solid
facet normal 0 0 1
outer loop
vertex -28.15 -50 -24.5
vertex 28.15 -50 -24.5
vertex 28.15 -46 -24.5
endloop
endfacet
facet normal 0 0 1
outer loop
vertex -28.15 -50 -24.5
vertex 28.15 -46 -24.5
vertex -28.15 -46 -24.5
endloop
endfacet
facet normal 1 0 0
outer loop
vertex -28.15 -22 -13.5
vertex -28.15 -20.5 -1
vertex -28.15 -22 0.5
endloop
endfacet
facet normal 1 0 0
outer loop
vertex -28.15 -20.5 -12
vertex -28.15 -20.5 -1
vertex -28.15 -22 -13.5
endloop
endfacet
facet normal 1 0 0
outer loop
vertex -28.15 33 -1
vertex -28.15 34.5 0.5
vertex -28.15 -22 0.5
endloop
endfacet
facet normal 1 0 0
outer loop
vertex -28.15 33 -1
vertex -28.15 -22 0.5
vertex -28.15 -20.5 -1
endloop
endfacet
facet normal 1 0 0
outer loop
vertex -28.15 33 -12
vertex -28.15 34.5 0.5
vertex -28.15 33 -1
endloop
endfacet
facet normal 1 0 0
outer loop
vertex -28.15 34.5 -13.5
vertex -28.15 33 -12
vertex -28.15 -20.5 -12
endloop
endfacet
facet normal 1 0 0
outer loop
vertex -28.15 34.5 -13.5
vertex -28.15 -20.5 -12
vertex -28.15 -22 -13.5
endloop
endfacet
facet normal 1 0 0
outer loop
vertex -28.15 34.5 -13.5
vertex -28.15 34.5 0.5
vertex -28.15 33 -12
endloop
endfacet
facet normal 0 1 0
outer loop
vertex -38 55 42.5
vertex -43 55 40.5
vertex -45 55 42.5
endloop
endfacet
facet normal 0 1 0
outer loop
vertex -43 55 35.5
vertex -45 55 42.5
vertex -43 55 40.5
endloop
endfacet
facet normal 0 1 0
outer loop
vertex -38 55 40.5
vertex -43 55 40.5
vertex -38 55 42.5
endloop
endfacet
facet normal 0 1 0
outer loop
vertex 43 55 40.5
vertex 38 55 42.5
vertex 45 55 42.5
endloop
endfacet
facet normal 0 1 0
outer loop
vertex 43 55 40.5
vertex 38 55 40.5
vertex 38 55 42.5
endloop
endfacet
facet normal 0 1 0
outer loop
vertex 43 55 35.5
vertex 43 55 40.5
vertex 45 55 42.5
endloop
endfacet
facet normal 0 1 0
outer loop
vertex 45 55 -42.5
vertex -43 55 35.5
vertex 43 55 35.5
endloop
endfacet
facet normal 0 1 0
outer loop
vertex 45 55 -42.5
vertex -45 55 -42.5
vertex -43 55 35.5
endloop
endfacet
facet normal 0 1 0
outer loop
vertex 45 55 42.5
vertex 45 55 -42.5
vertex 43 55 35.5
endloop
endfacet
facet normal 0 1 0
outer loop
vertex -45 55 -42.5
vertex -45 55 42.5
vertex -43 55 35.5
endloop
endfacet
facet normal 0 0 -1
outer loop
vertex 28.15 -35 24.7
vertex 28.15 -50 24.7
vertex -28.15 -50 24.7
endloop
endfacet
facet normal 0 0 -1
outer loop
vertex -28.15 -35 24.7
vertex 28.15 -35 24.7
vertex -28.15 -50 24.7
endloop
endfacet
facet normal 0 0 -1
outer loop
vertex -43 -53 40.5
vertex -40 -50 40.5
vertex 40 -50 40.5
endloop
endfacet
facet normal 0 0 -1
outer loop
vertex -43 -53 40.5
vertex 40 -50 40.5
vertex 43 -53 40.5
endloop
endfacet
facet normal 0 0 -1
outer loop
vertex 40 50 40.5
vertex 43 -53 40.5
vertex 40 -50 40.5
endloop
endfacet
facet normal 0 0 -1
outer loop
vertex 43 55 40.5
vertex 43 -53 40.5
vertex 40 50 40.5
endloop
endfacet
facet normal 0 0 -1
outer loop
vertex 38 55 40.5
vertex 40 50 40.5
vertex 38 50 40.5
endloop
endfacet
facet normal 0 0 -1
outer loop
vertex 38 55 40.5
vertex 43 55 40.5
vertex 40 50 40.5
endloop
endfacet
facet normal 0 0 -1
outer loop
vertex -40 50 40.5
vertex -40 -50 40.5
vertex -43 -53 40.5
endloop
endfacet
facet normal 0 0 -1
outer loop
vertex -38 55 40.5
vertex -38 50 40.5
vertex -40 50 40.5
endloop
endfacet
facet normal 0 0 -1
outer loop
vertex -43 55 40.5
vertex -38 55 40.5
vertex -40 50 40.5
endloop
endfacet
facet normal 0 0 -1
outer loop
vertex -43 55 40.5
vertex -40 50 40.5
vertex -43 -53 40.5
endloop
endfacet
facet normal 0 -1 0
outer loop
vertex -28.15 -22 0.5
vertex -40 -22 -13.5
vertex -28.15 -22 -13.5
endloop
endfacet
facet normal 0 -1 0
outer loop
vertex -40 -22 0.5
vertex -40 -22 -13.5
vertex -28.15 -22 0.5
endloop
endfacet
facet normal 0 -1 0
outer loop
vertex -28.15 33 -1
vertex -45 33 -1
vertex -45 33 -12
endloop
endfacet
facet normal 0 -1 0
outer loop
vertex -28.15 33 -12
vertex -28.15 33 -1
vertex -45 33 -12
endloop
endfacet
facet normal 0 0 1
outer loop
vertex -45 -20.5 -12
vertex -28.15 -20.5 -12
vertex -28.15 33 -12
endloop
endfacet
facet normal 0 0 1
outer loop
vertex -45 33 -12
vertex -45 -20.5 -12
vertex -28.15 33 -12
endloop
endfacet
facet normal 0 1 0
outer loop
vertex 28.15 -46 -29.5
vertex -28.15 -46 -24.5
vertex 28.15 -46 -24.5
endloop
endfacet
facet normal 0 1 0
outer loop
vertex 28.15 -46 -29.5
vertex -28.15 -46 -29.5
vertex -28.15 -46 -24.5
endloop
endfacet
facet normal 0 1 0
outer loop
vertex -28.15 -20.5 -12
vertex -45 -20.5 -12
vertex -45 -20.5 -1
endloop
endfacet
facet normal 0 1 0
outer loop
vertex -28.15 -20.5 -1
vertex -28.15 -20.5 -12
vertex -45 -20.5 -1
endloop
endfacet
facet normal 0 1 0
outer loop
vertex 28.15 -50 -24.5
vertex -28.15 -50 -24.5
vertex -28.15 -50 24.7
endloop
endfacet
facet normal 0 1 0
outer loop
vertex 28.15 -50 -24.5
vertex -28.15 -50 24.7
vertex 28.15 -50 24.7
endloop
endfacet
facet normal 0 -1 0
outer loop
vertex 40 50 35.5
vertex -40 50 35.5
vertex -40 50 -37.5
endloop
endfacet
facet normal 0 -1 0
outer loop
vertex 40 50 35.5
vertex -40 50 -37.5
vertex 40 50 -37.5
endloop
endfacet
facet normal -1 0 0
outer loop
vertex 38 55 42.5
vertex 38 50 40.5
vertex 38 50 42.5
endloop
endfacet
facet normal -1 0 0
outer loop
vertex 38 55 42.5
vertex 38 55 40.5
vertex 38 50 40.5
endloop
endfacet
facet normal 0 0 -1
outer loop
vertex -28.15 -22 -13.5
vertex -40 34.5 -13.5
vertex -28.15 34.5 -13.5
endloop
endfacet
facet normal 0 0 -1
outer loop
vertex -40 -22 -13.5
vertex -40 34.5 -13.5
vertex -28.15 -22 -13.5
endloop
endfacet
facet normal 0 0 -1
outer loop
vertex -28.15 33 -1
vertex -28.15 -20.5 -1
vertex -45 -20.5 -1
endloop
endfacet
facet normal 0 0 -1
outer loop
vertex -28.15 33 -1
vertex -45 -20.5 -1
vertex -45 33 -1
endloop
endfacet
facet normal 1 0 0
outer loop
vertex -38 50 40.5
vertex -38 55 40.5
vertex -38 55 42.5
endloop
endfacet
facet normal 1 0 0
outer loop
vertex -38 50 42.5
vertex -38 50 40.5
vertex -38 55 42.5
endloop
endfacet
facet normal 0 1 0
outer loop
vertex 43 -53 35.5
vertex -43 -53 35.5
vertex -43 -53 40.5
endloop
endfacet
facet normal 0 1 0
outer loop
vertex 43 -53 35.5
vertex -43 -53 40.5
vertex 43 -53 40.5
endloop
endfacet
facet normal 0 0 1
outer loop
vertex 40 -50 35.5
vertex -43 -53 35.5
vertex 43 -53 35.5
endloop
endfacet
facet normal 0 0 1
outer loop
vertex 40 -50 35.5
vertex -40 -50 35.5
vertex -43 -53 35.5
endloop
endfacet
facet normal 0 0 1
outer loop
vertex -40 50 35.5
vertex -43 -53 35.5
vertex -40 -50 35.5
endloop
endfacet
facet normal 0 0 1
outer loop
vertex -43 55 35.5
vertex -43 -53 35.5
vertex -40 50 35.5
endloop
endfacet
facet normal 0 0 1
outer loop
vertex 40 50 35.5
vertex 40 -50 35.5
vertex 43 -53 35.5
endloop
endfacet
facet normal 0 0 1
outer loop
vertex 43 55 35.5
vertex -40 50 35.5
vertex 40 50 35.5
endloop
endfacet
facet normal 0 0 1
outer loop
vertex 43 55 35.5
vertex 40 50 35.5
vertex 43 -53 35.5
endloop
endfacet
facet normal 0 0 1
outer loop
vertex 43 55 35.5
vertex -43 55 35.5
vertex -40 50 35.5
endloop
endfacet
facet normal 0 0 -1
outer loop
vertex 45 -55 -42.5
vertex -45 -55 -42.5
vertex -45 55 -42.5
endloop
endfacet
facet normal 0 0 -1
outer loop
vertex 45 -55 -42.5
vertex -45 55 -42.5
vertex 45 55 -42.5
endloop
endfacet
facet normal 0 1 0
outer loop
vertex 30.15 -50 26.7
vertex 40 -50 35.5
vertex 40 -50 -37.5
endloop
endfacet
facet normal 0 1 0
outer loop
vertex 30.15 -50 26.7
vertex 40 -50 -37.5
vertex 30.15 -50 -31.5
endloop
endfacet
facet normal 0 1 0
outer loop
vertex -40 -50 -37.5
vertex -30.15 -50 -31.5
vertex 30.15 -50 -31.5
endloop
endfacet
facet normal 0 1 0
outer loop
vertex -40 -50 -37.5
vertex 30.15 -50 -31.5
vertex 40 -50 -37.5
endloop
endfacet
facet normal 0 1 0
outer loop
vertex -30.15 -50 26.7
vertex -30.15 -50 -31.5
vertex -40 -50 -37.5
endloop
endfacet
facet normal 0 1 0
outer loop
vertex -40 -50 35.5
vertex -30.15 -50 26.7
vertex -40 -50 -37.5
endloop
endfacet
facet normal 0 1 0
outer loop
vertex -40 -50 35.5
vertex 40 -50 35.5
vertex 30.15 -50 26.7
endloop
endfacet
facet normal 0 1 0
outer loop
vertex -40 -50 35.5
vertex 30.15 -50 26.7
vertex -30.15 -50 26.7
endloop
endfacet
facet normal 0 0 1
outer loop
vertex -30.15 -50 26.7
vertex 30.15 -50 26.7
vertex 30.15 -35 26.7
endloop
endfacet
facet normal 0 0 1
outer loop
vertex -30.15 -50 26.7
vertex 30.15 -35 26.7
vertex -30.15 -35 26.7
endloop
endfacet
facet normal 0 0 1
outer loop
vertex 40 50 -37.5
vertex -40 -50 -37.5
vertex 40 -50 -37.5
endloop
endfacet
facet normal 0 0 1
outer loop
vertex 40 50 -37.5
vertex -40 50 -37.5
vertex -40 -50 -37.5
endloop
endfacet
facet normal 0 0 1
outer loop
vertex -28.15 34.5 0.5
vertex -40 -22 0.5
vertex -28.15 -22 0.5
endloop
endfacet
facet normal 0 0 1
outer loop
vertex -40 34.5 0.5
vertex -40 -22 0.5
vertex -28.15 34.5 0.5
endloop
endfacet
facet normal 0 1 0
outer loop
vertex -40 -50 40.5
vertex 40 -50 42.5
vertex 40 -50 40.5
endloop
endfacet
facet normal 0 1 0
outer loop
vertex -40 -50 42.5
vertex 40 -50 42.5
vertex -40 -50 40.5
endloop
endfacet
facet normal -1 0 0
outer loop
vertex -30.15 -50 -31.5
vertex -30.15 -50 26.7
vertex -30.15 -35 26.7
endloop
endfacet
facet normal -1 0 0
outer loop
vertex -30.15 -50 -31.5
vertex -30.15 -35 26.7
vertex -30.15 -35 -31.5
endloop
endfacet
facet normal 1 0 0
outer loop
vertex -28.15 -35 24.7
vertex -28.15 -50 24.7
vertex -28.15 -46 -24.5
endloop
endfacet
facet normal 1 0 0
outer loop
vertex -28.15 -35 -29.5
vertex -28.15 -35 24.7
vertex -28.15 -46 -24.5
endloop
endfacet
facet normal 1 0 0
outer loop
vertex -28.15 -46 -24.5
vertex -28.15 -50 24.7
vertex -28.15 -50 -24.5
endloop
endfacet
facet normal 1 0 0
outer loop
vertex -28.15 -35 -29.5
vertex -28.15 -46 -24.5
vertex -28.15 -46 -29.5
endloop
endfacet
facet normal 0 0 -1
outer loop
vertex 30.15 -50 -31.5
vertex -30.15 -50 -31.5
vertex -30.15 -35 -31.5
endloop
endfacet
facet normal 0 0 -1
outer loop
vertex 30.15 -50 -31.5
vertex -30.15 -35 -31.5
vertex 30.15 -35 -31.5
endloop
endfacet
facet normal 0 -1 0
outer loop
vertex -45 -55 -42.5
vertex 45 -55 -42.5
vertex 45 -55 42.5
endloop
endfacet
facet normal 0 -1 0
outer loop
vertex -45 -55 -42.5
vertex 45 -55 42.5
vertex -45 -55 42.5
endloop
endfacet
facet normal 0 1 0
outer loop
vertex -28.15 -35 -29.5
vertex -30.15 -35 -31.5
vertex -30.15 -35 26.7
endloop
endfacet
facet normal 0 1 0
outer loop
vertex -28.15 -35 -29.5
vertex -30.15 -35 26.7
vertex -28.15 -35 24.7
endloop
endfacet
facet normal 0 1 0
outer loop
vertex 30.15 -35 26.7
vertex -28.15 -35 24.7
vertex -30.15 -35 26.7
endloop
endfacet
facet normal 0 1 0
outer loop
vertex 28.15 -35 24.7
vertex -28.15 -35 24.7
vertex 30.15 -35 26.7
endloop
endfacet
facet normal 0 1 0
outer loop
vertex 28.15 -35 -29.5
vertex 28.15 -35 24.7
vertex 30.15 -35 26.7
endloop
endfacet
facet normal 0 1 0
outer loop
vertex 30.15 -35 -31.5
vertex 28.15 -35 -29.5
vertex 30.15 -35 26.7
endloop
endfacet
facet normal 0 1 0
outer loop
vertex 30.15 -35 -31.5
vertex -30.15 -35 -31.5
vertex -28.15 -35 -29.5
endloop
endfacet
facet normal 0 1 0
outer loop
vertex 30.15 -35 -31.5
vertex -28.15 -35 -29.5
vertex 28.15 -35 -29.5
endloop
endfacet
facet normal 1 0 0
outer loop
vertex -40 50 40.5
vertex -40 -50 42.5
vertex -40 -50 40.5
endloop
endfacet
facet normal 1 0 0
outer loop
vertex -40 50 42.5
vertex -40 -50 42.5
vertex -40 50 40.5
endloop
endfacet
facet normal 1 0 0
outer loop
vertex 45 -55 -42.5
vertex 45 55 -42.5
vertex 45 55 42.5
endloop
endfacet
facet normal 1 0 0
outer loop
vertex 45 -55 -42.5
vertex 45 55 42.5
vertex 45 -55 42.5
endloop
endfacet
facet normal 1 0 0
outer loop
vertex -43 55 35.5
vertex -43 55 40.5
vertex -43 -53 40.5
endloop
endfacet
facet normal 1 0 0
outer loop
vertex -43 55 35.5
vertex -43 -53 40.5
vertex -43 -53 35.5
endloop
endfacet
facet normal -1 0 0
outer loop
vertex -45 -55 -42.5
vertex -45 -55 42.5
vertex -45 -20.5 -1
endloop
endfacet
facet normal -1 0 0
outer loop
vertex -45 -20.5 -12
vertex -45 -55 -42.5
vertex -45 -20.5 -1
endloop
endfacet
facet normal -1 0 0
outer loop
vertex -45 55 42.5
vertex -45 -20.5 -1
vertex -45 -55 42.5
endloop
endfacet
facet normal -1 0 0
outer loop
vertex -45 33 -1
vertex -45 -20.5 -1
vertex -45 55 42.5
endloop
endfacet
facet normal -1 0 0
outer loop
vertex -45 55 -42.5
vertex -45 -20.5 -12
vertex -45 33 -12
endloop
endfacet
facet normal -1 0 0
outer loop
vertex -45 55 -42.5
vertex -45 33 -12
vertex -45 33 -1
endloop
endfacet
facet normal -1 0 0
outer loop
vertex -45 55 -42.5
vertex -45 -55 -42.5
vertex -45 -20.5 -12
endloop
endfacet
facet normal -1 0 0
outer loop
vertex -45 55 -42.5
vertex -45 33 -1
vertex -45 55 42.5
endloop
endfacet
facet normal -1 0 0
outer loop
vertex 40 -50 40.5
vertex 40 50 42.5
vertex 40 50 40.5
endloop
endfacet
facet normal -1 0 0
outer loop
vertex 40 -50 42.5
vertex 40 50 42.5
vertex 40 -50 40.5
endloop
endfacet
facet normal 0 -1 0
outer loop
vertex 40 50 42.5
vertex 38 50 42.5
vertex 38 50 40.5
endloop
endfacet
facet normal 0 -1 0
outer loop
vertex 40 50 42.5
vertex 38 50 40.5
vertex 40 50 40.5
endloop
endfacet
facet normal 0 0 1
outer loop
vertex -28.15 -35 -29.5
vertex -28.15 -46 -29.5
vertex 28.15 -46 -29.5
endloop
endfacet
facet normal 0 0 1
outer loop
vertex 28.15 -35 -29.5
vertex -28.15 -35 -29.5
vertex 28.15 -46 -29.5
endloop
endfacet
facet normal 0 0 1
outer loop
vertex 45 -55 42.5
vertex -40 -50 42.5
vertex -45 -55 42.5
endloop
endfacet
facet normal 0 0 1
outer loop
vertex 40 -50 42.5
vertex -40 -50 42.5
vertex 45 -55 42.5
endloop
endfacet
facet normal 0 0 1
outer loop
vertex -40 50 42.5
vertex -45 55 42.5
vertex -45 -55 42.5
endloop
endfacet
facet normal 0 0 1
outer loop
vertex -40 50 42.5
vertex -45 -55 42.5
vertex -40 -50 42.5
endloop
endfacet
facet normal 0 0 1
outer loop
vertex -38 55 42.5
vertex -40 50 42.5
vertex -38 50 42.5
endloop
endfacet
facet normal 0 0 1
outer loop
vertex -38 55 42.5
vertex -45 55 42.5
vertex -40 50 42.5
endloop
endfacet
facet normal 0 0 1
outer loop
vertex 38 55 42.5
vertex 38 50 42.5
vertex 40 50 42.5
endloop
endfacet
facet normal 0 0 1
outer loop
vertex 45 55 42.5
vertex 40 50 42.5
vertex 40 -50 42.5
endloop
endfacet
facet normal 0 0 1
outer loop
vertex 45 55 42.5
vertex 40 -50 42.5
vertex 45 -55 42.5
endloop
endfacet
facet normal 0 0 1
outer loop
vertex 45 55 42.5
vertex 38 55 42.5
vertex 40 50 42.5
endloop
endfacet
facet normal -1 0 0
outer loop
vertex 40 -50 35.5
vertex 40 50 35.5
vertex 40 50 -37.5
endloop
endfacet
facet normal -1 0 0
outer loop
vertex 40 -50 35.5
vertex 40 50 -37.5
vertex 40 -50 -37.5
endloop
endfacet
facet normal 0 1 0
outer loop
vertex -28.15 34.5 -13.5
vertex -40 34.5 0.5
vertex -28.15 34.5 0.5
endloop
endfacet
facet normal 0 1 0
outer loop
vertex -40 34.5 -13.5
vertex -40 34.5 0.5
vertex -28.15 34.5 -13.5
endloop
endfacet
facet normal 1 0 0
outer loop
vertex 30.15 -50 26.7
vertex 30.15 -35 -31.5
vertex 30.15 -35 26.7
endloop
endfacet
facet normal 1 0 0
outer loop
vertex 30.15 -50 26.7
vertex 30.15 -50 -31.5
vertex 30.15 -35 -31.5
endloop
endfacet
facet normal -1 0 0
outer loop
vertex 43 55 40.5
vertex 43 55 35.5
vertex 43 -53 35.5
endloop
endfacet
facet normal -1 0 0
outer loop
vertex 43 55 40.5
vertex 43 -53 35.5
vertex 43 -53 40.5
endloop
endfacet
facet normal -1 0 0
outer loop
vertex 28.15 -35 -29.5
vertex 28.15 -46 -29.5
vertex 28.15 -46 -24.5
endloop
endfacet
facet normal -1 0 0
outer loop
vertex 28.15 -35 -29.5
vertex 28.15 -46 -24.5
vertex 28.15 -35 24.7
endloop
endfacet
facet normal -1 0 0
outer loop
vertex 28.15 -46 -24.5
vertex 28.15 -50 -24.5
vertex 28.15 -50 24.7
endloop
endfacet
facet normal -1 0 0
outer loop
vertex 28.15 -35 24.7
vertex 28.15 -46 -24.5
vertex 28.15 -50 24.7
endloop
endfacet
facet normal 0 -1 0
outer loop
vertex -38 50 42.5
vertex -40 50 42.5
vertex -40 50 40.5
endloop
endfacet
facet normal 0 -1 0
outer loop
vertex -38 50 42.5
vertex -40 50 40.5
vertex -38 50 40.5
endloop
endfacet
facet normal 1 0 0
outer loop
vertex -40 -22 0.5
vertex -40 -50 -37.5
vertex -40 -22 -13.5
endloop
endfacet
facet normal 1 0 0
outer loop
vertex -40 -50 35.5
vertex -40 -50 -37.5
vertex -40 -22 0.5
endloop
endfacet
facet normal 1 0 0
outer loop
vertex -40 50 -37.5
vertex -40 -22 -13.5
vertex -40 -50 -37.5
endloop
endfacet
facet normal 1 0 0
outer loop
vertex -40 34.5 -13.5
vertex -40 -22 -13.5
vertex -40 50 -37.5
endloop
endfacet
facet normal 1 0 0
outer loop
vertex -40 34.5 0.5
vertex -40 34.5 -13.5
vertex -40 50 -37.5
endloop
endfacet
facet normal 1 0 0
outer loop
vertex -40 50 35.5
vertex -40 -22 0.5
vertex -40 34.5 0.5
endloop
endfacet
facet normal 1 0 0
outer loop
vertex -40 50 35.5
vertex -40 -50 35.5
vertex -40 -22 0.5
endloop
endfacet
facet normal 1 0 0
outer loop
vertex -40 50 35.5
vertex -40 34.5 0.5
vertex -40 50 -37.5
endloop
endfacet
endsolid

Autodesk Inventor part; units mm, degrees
ref_plane "YZ Plane" through (0, 0, 0) normal (1, 0, 0) x (0, 1, 0)
ref_plane "XZ Plane" through (0, 0, 0) normal (0, 1, 0) x (-1, 0, 0)
ref_plane "XY Plane" through (0, 0, 0) normal (0, 0, 1) x (1, 0, 0)
sketch "Sketch1" plane through (0, 0, 0) normal (0, 0, 1) x (1, 0, 0)
  line L0 (-45, 55) -> (45, 55)
  line L1 (45, 55) -> (45, -55)
  line L2 (45, -55) -> (-45, -55)
  line L3 (-45, -55) -> (-45, 55)
  point P0 (0, 0)
  point P1 (0, 55)
  point P2 (-45, 0)
  dimension "d0" = 110
  dimension "d1" = 90
extrude "Extrusion1" add sketch "Sketch1" along normal mid plane 85
sketch "Sketch2" plane through (0, 0, 42.5) normal (0, 0, 1) x (1, 0, 0)
  line L0 (-40, 50) -> (40, 50)
  line L1 (40, 50) -> (40, -50)
  line L2 (40, -50) -> (-40, -50)
  line L3 (-40, -50) -> (-40, 50)
  line L4 (45, 55) -> (-45, 55) projected
  line L5 (-45, 55) -> (-45, -55) projected
  point P0 (0, 0)
  point P1 (0, 50)
  point P2 (0, -50)
  point P3 (-40, 0)
  point P4 (40, 0)
  dimension "d6" = 5
  dimension "d7" = 5
extrude "Extrusion2" cut sketch "Sketch2" against normal blind 80
sketch "Sketch3" plane through (-45, 55, 42.5) normal (0, 1, 0) x (1, 0, 0)
  line L0 (2, 7) -> (88, 7)
  line L1 (88, 7) -> (88, 2)
  line L2 (2, 2) -> (2, 7)
  line L3 (90, 0) -> (0, 0) projected
  line L4 (0, 85) -> (0, 0) projected
  line L5 (7, 2) -> (7, 0)
  line L6 (85, 0) -> (5, 0) projected
  line L7 (83, 2) -> (83, 0)
  line L8 (88, 2) -> (83, 2)
  line L9 (7, 2) -> (2, 2)
  line L10 (7, 0) -> (83, 0)
  point P0 (45, 42.5)
  point P1 (45, 7)
  point P2 (2, 4.5)
  point P3 (7, 0)
  dimension "d14" = 2
  dimension "d15" = 5
  dimension "d16" = 7
  dimension "d17" = 7
  dimension "d18" = 7
  dimension "d19" = 5
extrude "Extrusion3" cut sketch "Sketch3" against normal up to surface (105 mm away)
sketch "Sketch4" plane through (-40, -50, 42.5) normal (0, 1, 0) x (1, 0, 0)
  line L0 (-3, 7) -> (83, 7)
  line L1 (83, 7) -> (83, 2)
  line L2 (83, 2) -> (-3, 2)
  line L3 (-3, 2) -> (-3, 7)
  line L4 (80, 0) -> (0, 0) projected
  point P0 (40, 42.5)
  point P1 (40, 2)
  point P2 (40, 0)
  point P3 (83, 4.5)
  point P4 (-3, 4.5)
  dimension "d22" = 2
  dimension "d23" = 86
  dimension "d24" = 5
extrude "Extrusion4" cut sketch "Sketch4" against normal blind 3
sketch "Sketch5" plane through (-40, -50, -37.5) normal (0, 1, 0) x (1, 0, 0)
  line L0 (80, 0) -> (0, 0) projected
  line L1 (11.85, -8) -> (68.15, -8)
  line L2 (68.15, -8) -> (68.15, -62.2)
  line L3 (68.15, -62.2) -> (11.85, -62.2)
  line L4 (11.85, -62.2) -> (11.85, -8)
  point P0 (40, -37.5)
  point P1 (40, -8)
  dimension "d37" = 56.3
  dimension "d38" = 54.2
  dimension "d39" = 8
sketch "Sketch6" plane through (-40, -50, -37.5) normal (0, 1, 0) x (1, 0, 0)
  line L0 (9.85, -6) -> (70.15, -6)
  line L1 (70.15, -6) -> (70.15, -64.2)
  line L2 (70.15, -64.2) -> (9.85, -64.2)
  line L3 (9.85, -64.2) -> (9.85, -6)
  line L4 (80, 0) -> (0, 0) projected
  point P0 (40, -37.5)
  point P1 (40, -6)
  dimension "d40" = 58.2
  dimension "d41" = 60.3
  dimension "d42" = 6
extrude "Extrusion5" add sketch "Sketch6" along normal blind 15
extrude "Extrusion6" cut sketch "Sketch5" along normal up to surface (15 mm away)
sketch "Sketch8" plane through (-40, -50, -37.5) normal (0, 1, 0) x (1, 0, 0)
  line L0 (11.85, -8) -> (68.15, -8) projected
  line L1 (68.15, -8) -> (68.15, -62.2) projected
  line L2 (11.85, -8) -> (68.15, -8)
  line L3 (68.15, -8) -> (68.15, -13)
  line L4 (68.15, -13) -> (11.85, -13)
  line L5 (11.85, -13) -> (11.85, -8)
  point P0 (40, -37.5)
  dimension "d48" = 5
extrude "Extrusion7" add sketch "Sketch8" along normal blind 4
sketch "Sketch10" plane through (-40, -50, -37.5) normal (1, 0, 0) x (0, 0, -1)
  line L0 (-25.5, 83) -> (-36.5, 83)
  line L1 (-36.5, 83) -> (-36.5, 29.5)
  line L2 (-36.5, 29.5) -> (-25.5, 29.5)
  line L3 (-25.5, 29.5) -> (-25.5, 83)
  line L4 (-8, 4) -> (-8, 15) projected
  line L5 (0, 0) -> (0, 100) projected
  line L6 (-13, 0) -> (-62.2, 0) projected
  point P0 (-37.5, 50)
  dimension "d52" = 25.5
  dimension "d53" = 11
  dimension "d54" = 29.5
  dimension "d55" = 53.5
extrude "Extrusion8" cut sketch "Sketch10" against normal up to surface (5 mm away)
sketch "Sketch11" plane through (-40, -50, -37.5) normal (1, 0, 0) x (0, 0, -1)
  line L0 (-38, 84.5) -> (-24, 84.5)
  line L1 (-24, 84.5) -> (-24, 28)
  line L2 (-24, 28) -> (-38, 28)
  line L3 (-38, 28) -> (-38, 84.5)
  line L4 (-36.5, 83) -> (-25.5, 83) projected
  line L5 (-36.5, 29.5) -> (-36.5, 83) projected
  point P0 (-37.5, 50)
  point P1 (-31, 84.5)
  point P2 (-31, 83)
  point P3 (-38, 56.25)
  point P4 (-36.5, 56.25)
  dimension "d58" = 1.5
  dimension "d59" = 1.5
extrude "Extrusion9" add sketch "Sketch11" along normal up to surface (11.85 mm away)
sketch "Sketch12" plane through (-28.15, -22, 0.5) normal (1, 0, 0) x (0, 0, -1)
  line L0 (12.5, 1.5) -> (12.5, 55) projected
  line L1 (1.5, 55) -> (12.5, 55)
  line L2 (12.5, 55) -> (12.5, 1.5)
  line L3 (12.5, 1.5) -> (1.5, 1.5)
  line L4 (1.5, 1.5) -> (1.5, 55)
  line L5 (14, 56.5) -> (0, 56.5) projected
  line L6 (0, 56.5) -> (0, 0) projected
  point P0 (0.5, 22)
  point P1 (7, 55)
  point P2 (7, 56.5)
  point P3 (0, 28.25)
  point P4 (1.5, 28.25)
  dimension "d62" = 1.5
extrude "Extrusion10" cut sketch "Sketch12" against normal up to surface (11.85 mm away)
properties part number "Part_C1"
